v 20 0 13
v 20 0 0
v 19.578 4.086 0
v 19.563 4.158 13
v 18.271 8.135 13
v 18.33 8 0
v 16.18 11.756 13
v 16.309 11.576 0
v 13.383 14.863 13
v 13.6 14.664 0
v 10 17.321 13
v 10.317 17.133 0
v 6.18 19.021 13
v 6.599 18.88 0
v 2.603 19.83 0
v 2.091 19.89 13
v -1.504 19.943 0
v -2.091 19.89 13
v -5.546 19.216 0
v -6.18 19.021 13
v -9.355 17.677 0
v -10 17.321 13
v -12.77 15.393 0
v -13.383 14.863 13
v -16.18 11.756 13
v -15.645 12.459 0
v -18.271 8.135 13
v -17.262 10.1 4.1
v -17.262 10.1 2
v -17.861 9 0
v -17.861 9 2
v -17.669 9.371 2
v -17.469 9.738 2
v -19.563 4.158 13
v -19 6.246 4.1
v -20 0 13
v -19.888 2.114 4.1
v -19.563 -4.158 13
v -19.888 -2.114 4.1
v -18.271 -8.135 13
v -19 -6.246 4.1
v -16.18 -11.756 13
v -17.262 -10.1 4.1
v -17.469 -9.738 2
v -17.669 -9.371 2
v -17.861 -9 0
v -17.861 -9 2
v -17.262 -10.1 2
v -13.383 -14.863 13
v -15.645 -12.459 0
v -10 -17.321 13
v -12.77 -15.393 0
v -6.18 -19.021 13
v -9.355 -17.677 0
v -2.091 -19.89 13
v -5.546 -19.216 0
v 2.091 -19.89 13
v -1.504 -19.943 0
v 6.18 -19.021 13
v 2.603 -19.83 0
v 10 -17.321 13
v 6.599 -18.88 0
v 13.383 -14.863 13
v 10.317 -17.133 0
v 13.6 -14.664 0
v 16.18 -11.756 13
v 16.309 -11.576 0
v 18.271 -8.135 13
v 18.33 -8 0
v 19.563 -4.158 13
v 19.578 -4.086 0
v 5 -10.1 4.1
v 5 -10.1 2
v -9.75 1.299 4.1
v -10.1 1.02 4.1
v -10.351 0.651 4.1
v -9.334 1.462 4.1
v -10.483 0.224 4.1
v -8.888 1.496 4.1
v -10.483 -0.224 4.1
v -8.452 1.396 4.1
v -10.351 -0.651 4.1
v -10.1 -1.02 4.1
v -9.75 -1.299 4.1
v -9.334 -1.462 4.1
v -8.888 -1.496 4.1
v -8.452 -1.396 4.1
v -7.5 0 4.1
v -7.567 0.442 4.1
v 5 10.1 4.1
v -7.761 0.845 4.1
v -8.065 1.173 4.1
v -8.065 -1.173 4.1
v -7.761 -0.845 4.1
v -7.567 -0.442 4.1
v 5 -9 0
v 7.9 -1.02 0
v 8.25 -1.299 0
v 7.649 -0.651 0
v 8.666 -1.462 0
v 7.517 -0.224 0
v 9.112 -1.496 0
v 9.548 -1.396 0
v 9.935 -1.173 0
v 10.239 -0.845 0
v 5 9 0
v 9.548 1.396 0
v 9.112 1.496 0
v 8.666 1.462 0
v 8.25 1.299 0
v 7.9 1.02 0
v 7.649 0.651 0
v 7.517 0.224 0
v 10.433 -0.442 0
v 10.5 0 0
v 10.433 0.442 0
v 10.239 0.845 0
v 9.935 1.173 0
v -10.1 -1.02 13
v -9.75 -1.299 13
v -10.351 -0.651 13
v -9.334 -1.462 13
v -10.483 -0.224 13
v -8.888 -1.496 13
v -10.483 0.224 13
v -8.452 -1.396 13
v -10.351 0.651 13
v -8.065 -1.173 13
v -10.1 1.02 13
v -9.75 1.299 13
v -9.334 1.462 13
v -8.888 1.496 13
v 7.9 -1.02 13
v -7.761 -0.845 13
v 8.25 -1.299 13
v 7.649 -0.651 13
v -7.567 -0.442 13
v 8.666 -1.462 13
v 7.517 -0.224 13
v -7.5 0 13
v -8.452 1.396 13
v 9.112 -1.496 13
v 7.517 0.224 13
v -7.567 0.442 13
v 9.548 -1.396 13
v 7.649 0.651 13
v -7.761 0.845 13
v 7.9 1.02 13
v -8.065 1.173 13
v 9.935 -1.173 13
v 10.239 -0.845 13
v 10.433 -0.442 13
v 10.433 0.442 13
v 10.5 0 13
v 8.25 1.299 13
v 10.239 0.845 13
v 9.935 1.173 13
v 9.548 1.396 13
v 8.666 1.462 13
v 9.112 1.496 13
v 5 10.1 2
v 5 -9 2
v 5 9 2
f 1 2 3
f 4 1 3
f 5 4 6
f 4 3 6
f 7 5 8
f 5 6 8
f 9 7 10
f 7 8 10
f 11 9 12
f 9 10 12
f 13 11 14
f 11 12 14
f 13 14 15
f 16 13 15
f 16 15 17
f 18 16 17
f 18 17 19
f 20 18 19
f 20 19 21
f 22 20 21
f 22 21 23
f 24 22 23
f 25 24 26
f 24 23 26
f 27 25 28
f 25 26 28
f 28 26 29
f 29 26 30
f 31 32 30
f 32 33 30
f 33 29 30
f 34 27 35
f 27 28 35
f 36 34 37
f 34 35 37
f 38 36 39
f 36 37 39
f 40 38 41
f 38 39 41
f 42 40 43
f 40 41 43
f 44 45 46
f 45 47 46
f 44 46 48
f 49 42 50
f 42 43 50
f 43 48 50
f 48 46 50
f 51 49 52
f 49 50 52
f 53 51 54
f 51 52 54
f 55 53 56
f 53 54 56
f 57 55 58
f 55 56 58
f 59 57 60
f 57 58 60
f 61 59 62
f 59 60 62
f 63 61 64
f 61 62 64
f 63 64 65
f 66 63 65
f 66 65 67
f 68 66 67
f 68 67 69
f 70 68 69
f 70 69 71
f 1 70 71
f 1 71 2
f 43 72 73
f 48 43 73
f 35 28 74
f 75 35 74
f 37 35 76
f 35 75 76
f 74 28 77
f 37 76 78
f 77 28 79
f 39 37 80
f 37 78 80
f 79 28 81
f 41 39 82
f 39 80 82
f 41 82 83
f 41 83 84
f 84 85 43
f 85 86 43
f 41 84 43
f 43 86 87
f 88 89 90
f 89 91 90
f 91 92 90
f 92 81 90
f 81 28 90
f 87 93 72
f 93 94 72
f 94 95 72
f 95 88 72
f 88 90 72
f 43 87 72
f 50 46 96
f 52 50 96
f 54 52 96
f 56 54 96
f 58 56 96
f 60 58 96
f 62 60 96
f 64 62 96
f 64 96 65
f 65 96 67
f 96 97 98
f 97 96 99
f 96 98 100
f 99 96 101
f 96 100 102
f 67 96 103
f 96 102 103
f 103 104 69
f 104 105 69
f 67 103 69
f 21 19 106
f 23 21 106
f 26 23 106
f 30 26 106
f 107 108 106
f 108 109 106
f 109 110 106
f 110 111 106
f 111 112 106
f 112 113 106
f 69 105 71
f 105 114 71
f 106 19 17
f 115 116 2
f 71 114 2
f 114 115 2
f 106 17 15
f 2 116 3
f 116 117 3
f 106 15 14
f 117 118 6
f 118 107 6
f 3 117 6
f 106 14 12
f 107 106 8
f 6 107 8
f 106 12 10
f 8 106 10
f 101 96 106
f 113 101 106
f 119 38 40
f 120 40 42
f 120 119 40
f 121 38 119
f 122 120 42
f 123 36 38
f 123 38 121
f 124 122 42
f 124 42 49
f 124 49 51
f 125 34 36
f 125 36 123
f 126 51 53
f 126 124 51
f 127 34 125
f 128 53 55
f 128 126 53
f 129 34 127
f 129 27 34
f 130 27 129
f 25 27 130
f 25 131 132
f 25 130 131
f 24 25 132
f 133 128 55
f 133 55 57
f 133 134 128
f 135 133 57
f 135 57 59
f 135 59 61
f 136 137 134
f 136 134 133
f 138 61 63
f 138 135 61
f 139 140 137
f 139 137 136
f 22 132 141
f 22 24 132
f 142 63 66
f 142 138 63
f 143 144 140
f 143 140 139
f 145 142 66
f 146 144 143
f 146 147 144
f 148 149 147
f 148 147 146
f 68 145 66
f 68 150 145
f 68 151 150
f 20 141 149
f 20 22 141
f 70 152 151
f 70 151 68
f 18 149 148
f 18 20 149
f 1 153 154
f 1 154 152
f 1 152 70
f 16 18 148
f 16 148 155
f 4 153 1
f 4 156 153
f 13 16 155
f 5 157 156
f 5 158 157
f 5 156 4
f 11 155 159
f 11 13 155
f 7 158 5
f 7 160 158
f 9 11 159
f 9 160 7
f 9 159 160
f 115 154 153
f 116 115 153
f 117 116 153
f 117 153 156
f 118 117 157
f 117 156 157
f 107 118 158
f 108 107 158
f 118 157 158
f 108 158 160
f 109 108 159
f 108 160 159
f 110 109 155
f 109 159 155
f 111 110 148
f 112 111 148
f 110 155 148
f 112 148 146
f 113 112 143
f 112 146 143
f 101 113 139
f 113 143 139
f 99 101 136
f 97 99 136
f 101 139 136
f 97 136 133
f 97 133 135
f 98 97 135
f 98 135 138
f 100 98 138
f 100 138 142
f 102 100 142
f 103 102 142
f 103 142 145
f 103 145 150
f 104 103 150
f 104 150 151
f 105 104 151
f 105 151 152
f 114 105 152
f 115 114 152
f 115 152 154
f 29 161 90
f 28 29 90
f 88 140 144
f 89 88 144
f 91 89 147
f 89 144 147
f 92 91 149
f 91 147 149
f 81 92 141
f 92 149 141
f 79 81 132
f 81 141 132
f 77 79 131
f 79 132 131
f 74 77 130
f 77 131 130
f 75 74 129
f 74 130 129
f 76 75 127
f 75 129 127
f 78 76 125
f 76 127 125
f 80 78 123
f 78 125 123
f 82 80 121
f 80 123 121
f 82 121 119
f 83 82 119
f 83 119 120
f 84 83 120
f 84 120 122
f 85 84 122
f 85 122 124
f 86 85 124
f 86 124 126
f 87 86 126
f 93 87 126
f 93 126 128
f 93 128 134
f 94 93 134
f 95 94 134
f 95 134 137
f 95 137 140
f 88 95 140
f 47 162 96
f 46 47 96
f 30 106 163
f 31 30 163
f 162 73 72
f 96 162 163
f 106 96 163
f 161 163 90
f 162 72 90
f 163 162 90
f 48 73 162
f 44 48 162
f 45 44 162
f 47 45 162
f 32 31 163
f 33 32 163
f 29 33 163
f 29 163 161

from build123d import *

# Parameters (mm, degrees)
F0_R          = 20
F1_DEPTH      = 13
F3_DEPTH      = 25
F3_DEPTH_BACK = 5
F4_R          = 1.5
F5_DEPTH      = 13.001


with BuildPart() as f1:
    # F0 (on Top) → F1 (new body)
    with BuildSketch(Plane.XY):
        Circle(F0_R)
    extrude(amount=F1_DEPTH)

    # F2 (on Right) → F3 (cut, two sides)
    with BuildSketch(Plane.YZ) as f3_sk:
        Polygon((-9, 2), (-9, 0), (9, 0), (9, 2), (10.1, 2), (10.1, 4.1), (-10.1, 4.1), (-10.1, 2), align=None)
    extrude(amount=-F3_DEPTH, mode=Mode.SUBTRACT)
    extrude(f3_sk.sketch, amount=F3_DEPTH_BACK, mode=Mode.SUBTRACT)

    # F4 (on face) → F5 (cut, through all)
    with BuildSketch(Plane.XY.offset(13)):
        with Locations((-9, 0)):
            Circle(F4_R)
        with Locations((9, 0)):
            Circle(F4_R)
    extrude(amount=-F5_DEPTH, mode=Mode.SUBTRACT)


solid = f1.part
